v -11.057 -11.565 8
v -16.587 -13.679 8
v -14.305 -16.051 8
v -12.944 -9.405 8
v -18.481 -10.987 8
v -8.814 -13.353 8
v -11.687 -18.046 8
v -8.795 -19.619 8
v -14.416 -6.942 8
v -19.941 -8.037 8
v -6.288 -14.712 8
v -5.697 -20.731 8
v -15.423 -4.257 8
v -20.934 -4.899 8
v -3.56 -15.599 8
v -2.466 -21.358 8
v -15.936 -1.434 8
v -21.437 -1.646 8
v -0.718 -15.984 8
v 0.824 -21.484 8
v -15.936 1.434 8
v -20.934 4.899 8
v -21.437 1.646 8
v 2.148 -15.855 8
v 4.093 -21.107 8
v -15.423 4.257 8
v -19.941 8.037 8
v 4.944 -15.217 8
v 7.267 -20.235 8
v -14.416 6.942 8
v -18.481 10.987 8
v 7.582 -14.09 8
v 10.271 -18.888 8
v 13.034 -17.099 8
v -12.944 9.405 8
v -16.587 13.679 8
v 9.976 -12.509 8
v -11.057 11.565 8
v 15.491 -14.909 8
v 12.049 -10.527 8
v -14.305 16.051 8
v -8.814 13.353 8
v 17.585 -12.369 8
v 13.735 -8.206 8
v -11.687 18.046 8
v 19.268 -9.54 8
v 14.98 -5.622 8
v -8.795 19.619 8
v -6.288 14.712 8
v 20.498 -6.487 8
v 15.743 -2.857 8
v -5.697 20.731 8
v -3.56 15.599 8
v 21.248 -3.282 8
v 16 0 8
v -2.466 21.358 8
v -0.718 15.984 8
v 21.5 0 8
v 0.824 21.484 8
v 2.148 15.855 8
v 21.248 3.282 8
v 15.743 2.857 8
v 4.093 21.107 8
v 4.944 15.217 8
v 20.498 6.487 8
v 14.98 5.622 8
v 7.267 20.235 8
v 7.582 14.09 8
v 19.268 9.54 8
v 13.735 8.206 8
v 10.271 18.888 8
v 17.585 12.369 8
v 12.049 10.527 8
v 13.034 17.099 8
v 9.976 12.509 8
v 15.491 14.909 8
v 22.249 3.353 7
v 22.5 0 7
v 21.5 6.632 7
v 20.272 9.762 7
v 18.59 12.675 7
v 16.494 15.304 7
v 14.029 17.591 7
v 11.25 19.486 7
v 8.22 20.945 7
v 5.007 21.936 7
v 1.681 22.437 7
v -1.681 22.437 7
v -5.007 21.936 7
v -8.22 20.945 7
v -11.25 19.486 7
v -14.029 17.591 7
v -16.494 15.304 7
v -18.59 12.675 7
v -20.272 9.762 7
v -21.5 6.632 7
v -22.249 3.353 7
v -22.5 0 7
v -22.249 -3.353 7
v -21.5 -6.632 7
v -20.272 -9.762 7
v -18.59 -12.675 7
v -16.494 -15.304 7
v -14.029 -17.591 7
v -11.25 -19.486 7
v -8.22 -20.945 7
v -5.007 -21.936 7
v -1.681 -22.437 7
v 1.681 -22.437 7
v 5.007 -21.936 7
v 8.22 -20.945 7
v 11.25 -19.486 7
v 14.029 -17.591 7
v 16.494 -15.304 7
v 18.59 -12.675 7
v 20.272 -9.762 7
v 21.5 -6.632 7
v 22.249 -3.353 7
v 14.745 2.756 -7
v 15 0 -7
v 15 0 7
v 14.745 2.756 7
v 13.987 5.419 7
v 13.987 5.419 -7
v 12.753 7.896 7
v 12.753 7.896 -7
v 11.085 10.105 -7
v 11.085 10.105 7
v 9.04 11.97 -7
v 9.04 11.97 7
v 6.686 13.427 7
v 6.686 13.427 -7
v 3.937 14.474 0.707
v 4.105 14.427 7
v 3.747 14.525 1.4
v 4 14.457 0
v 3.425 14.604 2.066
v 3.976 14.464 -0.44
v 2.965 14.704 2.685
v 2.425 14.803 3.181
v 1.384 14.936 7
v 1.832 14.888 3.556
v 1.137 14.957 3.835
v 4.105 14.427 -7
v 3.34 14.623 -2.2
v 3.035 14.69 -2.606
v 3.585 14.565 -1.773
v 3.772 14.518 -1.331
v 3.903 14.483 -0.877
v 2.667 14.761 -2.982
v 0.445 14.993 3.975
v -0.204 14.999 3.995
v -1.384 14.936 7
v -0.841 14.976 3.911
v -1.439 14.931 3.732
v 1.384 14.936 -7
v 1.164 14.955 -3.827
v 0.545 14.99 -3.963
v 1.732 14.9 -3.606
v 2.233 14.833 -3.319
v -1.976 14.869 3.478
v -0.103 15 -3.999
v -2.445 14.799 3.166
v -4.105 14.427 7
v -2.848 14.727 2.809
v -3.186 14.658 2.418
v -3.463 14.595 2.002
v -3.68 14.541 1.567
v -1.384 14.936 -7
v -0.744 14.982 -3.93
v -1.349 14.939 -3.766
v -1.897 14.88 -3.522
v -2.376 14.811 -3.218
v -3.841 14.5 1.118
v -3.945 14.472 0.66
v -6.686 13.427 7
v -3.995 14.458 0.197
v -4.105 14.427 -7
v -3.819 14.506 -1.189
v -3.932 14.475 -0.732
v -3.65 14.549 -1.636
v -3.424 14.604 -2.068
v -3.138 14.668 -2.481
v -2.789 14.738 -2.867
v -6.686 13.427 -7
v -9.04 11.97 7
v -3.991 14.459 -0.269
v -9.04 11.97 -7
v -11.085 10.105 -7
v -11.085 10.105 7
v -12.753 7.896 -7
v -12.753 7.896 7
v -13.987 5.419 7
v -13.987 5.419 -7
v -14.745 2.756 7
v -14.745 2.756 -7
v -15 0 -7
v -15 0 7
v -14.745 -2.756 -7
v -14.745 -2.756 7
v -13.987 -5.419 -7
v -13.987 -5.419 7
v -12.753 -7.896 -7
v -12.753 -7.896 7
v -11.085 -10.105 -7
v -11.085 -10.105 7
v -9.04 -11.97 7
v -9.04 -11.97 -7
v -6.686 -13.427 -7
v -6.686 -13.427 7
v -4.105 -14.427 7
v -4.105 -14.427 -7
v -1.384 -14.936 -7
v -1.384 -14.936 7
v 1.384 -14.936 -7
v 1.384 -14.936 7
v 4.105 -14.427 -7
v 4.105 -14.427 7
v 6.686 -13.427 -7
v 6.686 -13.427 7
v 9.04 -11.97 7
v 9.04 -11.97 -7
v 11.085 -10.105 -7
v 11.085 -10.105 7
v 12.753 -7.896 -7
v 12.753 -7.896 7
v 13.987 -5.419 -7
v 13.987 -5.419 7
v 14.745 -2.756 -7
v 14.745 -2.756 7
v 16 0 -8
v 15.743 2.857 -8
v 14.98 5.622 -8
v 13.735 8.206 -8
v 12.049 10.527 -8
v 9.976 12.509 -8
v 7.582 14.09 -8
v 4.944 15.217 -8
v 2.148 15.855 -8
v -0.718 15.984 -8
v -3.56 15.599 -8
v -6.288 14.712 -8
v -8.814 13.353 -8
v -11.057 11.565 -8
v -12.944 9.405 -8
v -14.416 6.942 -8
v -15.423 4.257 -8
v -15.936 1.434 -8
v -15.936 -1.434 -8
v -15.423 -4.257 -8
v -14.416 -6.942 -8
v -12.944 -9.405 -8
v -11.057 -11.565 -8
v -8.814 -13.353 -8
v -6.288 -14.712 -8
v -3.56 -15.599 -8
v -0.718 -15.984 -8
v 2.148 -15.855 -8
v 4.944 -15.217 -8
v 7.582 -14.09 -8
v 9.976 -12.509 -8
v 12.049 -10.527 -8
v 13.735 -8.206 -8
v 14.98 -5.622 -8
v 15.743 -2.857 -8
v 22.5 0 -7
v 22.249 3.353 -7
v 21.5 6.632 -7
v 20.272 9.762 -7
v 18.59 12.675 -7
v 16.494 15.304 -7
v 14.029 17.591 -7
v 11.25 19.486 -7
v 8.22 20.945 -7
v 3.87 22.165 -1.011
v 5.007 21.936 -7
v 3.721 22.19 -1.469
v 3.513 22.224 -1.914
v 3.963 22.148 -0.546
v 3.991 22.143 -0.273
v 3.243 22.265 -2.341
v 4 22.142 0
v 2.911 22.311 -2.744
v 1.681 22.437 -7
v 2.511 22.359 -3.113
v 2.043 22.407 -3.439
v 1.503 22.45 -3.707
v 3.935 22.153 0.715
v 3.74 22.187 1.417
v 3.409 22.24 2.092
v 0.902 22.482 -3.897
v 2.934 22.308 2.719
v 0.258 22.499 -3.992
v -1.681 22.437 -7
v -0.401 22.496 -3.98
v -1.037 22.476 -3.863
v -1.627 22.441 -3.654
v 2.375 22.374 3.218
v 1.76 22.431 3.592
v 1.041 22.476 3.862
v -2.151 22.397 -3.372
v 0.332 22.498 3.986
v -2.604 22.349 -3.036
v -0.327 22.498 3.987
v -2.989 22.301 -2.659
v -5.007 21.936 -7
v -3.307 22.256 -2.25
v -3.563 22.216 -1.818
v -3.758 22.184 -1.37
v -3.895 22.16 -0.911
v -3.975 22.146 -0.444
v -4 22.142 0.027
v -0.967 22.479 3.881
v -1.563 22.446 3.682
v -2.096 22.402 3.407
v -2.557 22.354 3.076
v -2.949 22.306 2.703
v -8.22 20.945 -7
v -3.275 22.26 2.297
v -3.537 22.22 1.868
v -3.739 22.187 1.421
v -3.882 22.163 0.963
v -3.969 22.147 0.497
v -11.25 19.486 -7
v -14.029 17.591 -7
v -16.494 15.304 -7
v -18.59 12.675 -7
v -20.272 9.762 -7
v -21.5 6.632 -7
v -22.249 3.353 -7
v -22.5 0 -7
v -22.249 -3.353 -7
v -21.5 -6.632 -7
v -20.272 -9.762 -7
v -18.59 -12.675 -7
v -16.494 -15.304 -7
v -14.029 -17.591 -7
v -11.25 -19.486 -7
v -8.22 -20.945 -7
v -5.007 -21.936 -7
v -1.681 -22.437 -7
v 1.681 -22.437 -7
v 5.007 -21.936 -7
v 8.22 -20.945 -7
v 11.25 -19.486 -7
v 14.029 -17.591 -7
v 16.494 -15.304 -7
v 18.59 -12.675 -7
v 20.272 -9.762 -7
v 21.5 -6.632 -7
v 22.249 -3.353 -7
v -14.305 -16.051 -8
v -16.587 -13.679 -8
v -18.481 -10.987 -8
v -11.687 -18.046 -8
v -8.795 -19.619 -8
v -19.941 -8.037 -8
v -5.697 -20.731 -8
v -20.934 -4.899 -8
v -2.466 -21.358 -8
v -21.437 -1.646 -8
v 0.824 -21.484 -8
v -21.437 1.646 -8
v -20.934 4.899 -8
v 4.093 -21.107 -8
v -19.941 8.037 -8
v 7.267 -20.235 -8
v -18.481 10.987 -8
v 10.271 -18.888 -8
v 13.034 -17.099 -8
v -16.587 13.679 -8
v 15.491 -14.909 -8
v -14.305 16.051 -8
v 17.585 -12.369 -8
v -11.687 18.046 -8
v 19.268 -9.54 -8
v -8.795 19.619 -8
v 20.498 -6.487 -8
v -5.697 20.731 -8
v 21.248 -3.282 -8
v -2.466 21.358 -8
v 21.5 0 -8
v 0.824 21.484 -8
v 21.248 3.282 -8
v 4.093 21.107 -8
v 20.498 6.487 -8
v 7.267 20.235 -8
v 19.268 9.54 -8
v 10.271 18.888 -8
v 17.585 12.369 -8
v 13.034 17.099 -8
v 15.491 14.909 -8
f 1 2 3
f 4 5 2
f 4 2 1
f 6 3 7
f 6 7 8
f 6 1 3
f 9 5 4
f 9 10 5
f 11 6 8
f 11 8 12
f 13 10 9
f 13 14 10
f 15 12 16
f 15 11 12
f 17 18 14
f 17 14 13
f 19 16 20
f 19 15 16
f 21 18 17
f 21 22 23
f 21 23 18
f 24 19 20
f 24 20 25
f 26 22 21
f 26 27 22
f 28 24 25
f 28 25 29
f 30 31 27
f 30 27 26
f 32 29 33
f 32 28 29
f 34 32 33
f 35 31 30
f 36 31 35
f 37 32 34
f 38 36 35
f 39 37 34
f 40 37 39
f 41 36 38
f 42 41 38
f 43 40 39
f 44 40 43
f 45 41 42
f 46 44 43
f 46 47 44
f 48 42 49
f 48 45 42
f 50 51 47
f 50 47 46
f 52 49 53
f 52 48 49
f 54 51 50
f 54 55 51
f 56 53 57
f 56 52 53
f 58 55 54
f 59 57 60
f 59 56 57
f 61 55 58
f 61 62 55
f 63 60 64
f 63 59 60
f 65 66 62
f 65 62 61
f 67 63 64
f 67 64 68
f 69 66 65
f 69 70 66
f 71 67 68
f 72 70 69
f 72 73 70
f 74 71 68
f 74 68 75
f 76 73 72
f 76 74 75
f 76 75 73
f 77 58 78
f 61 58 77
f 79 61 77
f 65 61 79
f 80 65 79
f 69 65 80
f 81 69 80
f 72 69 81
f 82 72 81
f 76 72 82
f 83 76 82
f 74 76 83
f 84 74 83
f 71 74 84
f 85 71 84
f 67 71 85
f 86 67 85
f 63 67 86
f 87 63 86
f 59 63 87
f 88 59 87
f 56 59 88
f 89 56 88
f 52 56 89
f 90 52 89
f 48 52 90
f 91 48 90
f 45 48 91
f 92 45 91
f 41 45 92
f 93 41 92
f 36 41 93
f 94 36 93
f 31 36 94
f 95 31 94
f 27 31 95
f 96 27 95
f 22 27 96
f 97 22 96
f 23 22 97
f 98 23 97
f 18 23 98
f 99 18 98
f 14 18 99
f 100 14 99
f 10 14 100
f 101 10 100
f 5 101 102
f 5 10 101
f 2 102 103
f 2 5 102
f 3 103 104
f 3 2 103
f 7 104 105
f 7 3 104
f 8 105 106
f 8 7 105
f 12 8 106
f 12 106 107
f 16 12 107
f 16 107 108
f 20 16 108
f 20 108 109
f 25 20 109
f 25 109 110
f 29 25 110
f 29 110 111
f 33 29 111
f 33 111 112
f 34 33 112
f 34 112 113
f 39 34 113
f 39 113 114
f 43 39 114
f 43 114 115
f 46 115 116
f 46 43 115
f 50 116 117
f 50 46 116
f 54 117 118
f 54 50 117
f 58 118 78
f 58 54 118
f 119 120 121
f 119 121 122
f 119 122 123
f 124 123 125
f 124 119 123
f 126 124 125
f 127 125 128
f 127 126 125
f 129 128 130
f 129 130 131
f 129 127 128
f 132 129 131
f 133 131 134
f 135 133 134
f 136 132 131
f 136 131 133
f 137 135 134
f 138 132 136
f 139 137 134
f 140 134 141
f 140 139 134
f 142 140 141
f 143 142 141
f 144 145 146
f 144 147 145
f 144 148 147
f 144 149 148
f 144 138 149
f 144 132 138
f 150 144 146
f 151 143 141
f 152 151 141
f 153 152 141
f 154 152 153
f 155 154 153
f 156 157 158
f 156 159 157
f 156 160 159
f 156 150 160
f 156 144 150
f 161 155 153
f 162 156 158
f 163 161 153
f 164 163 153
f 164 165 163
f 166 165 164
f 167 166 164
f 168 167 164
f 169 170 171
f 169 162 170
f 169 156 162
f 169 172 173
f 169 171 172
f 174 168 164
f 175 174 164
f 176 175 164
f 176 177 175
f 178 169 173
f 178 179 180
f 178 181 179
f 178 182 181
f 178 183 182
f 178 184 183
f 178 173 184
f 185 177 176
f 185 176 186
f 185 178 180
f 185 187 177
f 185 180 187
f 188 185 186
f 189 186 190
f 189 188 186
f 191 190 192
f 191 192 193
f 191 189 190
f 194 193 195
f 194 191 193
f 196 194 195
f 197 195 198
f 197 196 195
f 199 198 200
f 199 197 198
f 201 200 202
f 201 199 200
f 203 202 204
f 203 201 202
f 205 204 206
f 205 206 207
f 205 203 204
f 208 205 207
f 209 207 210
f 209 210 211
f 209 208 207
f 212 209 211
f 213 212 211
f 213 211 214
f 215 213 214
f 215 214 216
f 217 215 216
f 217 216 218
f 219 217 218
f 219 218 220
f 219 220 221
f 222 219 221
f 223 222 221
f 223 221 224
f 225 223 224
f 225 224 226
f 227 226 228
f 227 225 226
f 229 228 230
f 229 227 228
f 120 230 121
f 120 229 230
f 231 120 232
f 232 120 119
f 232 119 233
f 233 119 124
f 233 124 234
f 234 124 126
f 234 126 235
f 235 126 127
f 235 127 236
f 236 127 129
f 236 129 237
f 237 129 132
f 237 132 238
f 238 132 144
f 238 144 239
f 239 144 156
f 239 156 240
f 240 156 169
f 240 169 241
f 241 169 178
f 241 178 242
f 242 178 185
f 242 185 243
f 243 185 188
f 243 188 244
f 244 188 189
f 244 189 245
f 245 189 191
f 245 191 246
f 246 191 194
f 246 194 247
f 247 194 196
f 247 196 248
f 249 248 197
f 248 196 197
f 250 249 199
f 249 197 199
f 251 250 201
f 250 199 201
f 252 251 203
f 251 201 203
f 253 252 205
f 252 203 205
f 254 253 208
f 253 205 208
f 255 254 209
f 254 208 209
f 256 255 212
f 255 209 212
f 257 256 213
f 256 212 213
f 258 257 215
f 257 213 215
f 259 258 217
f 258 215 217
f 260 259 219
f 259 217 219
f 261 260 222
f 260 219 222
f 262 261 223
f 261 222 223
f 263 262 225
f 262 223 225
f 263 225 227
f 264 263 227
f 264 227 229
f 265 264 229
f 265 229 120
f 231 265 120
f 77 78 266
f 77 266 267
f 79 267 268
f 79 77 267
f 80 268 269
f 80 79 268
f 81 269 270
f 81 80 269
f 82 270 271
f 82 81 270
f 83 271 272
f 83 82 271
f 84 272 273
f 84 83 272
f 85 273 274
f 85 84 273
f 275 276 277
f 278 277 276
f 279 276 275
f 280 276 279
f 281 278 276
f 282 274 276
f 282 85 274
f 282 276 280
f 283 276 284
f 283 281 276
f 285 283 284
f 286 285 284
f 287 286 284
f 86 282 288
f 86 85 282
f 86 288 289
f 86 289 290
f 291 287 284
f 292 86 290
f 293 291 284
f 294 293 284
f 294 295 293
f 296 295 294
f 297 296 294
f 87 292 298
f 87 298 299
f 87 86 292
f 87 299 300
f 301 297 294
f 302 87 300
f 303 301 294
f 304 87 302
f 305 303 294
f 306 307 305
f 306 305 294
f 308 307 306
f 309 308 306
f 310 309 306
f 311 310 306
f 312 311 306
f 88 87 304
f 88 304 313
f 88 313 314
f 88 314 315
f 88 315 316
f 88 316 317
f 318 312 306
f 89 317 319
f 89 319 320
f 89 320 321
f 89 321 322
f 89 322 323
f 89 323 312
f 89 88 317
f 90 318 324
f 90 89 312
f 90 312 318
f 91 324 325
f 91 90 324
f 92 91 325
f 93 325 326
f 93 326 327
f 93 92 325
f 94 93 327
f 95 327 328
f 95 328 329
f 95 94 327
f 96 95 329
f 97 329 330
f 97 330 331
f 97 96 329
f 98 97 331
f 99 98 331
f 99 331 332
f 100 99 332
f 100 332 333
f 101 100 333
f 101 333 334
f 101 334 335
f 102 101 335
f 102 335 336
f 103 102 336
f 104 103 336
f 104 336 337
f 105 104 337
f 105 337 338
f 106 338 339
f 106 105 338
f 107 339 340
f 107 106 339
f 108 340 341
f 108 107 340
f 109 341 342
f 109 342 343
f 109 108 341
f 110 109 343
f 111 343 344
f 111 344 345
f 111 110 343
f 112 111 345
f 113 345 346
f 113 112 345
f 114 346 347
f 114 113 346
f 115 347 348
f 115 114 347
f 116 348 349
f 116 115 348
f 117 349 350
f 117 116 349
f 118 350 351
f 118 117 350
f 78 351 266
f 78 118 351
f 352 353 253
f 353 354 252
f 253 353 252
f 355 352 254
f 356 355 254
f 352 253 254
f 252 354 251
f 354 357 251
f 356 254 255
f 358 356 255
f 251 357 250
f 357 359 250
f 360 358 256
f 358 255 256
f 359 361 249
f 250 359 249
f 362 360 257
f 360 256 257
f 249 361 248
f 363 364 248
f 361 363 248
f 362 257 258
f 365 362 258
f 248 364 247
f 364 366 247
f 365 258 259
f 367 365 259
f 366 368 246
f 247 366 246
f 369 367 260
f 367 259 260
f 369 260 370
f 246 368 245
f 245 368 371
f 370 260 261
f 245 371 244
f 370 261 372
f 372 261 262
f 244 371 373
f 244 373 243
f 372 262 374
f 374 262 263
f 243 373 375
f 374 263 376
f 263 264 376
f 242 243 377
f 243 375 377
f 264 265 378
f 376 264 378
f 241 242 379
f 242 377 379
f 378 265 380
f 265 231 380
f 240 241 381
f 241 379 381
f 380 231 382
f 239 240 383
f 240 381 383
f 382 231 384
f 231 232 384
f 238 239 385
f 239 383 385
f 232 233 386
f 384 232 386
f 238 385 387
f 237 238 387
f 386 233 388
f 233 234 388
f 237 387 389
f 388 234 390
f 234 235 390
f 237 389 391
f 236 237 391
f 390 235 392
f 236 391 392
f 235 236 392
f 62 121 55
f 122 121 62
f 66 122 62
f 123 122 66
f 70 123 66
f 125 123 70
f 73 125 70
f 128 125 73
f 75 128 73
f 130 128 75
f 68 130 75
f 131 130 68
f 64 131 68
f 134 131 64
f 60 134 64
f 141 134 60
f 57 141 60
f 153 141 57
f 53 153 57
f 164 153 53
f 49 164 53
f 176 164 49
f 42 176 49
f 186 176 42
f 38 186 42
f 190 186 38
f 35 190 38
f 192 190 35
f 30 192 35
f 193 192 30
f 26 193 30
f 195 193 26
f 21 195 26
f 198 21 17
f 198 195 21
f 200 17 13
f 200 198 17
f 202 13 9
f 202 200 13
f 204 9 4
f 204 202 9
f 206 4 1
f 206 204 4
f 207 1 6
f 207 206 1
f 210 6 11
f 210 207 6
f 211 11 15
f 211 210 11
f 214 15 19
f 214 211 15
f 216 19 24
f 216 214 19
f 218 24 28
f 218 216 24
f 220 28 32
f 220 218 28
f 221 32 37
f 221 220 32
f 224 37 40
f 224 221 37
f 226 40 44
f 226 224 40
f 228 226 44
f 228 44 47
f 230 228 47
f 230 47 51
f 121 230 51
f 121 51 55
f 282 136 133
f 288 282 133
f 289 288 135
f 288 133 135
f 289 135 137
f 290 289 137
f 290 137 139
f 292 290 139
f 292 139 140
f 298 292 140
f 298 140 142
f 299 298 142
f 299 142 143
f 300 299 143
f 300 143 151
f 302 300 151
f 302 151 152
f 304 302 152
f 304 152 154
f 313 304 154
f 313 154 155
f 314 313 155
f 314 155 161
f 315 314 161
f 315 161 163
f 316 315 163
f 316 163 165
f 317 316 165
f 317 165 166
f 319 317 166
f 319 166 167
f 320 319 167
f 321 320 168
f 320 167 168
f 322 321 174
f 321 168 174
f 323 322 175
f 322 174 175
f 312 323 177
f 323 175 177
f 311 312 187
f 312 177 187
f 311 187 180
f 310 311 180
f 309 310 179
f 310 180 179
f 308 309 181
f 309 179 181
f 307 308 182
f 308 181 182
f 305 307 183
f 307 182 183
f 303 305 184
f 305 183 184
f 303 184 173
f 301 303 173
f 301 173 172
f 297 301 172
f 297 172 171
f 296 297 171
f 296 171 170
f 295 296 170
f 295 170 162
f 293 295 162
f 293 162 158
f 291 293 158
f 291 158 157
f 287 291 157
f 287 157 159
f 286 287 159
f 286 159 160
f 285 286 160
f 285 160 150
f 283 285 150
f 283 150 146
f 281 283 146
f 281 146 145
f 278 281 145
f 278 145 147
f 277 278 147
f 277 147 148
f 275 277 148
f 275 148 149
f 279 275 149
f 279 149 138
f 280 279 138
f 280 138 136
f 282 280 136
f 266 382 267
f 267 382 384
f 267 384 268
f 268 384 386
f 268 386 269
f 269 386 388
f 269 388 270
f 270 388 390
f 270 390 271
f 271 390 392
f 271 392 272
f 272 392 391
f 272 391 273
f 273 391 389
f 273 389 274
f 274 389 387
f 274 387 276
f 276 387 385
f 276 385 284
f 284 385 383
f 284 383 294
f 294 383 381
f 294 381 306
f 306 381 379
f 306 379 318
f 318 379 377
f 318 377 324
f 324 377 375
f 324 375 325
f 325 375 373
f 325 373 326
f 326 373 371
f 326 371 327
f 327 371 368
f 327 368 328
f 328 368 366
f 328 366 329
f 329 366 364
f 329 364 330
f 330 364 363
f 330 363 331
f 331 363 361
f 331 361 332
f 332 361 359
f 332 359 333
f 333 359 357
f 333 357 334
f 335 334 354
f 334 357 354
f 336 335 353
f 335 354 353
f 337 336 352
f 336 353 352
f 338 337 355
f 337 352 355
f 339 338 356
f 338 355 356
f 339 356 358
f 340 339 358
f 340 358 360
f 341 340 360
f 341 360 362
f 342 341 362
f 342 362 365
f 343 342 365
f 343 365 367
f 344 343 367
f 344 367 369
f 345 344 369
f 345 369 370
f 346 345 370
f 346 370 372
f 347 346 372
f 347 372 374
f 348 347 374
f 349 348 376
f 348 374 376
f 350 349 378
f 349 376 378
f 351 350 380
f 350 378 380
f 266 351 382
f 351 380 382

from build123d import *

# Parameters (mm, degrees)
SKETCH_R     = 22.5
SKETCH_R_2   = 15
PAD_DEPTH    = 8
SKETCH001_R  = 4
POCKET_DEPTH = 22.501
CHAMFER_SIZE = 1


with BuildPart() as part:
    # Sketch → Pad (new body, symmetric)
    with BuildSketch(Plane.XY):
        Circle(SKETCH_R)
        Circle(SKETCH_R_2, mode=Mode.SUBTRACT)
    extrude(amount=PAD_DEPTH, both=True)

    # Sketch001 → Pocket (cut, through all)
    with BuildSketch(Plane.XZ):
        Circle(SKETCH001_R)
    extrude(amount=-POCKET_DEPTH, mode=Mode.SUBTRACT)

    # Chamfer
    chamfer_edges = [part.edges().sort_by_distance(p)[0] for p in [
        (-15, 0, -8),
        (-22.5, 0, -8),
        (-15, 0, 8),
        (-22.5, 0, 8),
    ]]
    chamfer(chamfer_edges, length=CHAMFER_SIZE)


solid = part.part
